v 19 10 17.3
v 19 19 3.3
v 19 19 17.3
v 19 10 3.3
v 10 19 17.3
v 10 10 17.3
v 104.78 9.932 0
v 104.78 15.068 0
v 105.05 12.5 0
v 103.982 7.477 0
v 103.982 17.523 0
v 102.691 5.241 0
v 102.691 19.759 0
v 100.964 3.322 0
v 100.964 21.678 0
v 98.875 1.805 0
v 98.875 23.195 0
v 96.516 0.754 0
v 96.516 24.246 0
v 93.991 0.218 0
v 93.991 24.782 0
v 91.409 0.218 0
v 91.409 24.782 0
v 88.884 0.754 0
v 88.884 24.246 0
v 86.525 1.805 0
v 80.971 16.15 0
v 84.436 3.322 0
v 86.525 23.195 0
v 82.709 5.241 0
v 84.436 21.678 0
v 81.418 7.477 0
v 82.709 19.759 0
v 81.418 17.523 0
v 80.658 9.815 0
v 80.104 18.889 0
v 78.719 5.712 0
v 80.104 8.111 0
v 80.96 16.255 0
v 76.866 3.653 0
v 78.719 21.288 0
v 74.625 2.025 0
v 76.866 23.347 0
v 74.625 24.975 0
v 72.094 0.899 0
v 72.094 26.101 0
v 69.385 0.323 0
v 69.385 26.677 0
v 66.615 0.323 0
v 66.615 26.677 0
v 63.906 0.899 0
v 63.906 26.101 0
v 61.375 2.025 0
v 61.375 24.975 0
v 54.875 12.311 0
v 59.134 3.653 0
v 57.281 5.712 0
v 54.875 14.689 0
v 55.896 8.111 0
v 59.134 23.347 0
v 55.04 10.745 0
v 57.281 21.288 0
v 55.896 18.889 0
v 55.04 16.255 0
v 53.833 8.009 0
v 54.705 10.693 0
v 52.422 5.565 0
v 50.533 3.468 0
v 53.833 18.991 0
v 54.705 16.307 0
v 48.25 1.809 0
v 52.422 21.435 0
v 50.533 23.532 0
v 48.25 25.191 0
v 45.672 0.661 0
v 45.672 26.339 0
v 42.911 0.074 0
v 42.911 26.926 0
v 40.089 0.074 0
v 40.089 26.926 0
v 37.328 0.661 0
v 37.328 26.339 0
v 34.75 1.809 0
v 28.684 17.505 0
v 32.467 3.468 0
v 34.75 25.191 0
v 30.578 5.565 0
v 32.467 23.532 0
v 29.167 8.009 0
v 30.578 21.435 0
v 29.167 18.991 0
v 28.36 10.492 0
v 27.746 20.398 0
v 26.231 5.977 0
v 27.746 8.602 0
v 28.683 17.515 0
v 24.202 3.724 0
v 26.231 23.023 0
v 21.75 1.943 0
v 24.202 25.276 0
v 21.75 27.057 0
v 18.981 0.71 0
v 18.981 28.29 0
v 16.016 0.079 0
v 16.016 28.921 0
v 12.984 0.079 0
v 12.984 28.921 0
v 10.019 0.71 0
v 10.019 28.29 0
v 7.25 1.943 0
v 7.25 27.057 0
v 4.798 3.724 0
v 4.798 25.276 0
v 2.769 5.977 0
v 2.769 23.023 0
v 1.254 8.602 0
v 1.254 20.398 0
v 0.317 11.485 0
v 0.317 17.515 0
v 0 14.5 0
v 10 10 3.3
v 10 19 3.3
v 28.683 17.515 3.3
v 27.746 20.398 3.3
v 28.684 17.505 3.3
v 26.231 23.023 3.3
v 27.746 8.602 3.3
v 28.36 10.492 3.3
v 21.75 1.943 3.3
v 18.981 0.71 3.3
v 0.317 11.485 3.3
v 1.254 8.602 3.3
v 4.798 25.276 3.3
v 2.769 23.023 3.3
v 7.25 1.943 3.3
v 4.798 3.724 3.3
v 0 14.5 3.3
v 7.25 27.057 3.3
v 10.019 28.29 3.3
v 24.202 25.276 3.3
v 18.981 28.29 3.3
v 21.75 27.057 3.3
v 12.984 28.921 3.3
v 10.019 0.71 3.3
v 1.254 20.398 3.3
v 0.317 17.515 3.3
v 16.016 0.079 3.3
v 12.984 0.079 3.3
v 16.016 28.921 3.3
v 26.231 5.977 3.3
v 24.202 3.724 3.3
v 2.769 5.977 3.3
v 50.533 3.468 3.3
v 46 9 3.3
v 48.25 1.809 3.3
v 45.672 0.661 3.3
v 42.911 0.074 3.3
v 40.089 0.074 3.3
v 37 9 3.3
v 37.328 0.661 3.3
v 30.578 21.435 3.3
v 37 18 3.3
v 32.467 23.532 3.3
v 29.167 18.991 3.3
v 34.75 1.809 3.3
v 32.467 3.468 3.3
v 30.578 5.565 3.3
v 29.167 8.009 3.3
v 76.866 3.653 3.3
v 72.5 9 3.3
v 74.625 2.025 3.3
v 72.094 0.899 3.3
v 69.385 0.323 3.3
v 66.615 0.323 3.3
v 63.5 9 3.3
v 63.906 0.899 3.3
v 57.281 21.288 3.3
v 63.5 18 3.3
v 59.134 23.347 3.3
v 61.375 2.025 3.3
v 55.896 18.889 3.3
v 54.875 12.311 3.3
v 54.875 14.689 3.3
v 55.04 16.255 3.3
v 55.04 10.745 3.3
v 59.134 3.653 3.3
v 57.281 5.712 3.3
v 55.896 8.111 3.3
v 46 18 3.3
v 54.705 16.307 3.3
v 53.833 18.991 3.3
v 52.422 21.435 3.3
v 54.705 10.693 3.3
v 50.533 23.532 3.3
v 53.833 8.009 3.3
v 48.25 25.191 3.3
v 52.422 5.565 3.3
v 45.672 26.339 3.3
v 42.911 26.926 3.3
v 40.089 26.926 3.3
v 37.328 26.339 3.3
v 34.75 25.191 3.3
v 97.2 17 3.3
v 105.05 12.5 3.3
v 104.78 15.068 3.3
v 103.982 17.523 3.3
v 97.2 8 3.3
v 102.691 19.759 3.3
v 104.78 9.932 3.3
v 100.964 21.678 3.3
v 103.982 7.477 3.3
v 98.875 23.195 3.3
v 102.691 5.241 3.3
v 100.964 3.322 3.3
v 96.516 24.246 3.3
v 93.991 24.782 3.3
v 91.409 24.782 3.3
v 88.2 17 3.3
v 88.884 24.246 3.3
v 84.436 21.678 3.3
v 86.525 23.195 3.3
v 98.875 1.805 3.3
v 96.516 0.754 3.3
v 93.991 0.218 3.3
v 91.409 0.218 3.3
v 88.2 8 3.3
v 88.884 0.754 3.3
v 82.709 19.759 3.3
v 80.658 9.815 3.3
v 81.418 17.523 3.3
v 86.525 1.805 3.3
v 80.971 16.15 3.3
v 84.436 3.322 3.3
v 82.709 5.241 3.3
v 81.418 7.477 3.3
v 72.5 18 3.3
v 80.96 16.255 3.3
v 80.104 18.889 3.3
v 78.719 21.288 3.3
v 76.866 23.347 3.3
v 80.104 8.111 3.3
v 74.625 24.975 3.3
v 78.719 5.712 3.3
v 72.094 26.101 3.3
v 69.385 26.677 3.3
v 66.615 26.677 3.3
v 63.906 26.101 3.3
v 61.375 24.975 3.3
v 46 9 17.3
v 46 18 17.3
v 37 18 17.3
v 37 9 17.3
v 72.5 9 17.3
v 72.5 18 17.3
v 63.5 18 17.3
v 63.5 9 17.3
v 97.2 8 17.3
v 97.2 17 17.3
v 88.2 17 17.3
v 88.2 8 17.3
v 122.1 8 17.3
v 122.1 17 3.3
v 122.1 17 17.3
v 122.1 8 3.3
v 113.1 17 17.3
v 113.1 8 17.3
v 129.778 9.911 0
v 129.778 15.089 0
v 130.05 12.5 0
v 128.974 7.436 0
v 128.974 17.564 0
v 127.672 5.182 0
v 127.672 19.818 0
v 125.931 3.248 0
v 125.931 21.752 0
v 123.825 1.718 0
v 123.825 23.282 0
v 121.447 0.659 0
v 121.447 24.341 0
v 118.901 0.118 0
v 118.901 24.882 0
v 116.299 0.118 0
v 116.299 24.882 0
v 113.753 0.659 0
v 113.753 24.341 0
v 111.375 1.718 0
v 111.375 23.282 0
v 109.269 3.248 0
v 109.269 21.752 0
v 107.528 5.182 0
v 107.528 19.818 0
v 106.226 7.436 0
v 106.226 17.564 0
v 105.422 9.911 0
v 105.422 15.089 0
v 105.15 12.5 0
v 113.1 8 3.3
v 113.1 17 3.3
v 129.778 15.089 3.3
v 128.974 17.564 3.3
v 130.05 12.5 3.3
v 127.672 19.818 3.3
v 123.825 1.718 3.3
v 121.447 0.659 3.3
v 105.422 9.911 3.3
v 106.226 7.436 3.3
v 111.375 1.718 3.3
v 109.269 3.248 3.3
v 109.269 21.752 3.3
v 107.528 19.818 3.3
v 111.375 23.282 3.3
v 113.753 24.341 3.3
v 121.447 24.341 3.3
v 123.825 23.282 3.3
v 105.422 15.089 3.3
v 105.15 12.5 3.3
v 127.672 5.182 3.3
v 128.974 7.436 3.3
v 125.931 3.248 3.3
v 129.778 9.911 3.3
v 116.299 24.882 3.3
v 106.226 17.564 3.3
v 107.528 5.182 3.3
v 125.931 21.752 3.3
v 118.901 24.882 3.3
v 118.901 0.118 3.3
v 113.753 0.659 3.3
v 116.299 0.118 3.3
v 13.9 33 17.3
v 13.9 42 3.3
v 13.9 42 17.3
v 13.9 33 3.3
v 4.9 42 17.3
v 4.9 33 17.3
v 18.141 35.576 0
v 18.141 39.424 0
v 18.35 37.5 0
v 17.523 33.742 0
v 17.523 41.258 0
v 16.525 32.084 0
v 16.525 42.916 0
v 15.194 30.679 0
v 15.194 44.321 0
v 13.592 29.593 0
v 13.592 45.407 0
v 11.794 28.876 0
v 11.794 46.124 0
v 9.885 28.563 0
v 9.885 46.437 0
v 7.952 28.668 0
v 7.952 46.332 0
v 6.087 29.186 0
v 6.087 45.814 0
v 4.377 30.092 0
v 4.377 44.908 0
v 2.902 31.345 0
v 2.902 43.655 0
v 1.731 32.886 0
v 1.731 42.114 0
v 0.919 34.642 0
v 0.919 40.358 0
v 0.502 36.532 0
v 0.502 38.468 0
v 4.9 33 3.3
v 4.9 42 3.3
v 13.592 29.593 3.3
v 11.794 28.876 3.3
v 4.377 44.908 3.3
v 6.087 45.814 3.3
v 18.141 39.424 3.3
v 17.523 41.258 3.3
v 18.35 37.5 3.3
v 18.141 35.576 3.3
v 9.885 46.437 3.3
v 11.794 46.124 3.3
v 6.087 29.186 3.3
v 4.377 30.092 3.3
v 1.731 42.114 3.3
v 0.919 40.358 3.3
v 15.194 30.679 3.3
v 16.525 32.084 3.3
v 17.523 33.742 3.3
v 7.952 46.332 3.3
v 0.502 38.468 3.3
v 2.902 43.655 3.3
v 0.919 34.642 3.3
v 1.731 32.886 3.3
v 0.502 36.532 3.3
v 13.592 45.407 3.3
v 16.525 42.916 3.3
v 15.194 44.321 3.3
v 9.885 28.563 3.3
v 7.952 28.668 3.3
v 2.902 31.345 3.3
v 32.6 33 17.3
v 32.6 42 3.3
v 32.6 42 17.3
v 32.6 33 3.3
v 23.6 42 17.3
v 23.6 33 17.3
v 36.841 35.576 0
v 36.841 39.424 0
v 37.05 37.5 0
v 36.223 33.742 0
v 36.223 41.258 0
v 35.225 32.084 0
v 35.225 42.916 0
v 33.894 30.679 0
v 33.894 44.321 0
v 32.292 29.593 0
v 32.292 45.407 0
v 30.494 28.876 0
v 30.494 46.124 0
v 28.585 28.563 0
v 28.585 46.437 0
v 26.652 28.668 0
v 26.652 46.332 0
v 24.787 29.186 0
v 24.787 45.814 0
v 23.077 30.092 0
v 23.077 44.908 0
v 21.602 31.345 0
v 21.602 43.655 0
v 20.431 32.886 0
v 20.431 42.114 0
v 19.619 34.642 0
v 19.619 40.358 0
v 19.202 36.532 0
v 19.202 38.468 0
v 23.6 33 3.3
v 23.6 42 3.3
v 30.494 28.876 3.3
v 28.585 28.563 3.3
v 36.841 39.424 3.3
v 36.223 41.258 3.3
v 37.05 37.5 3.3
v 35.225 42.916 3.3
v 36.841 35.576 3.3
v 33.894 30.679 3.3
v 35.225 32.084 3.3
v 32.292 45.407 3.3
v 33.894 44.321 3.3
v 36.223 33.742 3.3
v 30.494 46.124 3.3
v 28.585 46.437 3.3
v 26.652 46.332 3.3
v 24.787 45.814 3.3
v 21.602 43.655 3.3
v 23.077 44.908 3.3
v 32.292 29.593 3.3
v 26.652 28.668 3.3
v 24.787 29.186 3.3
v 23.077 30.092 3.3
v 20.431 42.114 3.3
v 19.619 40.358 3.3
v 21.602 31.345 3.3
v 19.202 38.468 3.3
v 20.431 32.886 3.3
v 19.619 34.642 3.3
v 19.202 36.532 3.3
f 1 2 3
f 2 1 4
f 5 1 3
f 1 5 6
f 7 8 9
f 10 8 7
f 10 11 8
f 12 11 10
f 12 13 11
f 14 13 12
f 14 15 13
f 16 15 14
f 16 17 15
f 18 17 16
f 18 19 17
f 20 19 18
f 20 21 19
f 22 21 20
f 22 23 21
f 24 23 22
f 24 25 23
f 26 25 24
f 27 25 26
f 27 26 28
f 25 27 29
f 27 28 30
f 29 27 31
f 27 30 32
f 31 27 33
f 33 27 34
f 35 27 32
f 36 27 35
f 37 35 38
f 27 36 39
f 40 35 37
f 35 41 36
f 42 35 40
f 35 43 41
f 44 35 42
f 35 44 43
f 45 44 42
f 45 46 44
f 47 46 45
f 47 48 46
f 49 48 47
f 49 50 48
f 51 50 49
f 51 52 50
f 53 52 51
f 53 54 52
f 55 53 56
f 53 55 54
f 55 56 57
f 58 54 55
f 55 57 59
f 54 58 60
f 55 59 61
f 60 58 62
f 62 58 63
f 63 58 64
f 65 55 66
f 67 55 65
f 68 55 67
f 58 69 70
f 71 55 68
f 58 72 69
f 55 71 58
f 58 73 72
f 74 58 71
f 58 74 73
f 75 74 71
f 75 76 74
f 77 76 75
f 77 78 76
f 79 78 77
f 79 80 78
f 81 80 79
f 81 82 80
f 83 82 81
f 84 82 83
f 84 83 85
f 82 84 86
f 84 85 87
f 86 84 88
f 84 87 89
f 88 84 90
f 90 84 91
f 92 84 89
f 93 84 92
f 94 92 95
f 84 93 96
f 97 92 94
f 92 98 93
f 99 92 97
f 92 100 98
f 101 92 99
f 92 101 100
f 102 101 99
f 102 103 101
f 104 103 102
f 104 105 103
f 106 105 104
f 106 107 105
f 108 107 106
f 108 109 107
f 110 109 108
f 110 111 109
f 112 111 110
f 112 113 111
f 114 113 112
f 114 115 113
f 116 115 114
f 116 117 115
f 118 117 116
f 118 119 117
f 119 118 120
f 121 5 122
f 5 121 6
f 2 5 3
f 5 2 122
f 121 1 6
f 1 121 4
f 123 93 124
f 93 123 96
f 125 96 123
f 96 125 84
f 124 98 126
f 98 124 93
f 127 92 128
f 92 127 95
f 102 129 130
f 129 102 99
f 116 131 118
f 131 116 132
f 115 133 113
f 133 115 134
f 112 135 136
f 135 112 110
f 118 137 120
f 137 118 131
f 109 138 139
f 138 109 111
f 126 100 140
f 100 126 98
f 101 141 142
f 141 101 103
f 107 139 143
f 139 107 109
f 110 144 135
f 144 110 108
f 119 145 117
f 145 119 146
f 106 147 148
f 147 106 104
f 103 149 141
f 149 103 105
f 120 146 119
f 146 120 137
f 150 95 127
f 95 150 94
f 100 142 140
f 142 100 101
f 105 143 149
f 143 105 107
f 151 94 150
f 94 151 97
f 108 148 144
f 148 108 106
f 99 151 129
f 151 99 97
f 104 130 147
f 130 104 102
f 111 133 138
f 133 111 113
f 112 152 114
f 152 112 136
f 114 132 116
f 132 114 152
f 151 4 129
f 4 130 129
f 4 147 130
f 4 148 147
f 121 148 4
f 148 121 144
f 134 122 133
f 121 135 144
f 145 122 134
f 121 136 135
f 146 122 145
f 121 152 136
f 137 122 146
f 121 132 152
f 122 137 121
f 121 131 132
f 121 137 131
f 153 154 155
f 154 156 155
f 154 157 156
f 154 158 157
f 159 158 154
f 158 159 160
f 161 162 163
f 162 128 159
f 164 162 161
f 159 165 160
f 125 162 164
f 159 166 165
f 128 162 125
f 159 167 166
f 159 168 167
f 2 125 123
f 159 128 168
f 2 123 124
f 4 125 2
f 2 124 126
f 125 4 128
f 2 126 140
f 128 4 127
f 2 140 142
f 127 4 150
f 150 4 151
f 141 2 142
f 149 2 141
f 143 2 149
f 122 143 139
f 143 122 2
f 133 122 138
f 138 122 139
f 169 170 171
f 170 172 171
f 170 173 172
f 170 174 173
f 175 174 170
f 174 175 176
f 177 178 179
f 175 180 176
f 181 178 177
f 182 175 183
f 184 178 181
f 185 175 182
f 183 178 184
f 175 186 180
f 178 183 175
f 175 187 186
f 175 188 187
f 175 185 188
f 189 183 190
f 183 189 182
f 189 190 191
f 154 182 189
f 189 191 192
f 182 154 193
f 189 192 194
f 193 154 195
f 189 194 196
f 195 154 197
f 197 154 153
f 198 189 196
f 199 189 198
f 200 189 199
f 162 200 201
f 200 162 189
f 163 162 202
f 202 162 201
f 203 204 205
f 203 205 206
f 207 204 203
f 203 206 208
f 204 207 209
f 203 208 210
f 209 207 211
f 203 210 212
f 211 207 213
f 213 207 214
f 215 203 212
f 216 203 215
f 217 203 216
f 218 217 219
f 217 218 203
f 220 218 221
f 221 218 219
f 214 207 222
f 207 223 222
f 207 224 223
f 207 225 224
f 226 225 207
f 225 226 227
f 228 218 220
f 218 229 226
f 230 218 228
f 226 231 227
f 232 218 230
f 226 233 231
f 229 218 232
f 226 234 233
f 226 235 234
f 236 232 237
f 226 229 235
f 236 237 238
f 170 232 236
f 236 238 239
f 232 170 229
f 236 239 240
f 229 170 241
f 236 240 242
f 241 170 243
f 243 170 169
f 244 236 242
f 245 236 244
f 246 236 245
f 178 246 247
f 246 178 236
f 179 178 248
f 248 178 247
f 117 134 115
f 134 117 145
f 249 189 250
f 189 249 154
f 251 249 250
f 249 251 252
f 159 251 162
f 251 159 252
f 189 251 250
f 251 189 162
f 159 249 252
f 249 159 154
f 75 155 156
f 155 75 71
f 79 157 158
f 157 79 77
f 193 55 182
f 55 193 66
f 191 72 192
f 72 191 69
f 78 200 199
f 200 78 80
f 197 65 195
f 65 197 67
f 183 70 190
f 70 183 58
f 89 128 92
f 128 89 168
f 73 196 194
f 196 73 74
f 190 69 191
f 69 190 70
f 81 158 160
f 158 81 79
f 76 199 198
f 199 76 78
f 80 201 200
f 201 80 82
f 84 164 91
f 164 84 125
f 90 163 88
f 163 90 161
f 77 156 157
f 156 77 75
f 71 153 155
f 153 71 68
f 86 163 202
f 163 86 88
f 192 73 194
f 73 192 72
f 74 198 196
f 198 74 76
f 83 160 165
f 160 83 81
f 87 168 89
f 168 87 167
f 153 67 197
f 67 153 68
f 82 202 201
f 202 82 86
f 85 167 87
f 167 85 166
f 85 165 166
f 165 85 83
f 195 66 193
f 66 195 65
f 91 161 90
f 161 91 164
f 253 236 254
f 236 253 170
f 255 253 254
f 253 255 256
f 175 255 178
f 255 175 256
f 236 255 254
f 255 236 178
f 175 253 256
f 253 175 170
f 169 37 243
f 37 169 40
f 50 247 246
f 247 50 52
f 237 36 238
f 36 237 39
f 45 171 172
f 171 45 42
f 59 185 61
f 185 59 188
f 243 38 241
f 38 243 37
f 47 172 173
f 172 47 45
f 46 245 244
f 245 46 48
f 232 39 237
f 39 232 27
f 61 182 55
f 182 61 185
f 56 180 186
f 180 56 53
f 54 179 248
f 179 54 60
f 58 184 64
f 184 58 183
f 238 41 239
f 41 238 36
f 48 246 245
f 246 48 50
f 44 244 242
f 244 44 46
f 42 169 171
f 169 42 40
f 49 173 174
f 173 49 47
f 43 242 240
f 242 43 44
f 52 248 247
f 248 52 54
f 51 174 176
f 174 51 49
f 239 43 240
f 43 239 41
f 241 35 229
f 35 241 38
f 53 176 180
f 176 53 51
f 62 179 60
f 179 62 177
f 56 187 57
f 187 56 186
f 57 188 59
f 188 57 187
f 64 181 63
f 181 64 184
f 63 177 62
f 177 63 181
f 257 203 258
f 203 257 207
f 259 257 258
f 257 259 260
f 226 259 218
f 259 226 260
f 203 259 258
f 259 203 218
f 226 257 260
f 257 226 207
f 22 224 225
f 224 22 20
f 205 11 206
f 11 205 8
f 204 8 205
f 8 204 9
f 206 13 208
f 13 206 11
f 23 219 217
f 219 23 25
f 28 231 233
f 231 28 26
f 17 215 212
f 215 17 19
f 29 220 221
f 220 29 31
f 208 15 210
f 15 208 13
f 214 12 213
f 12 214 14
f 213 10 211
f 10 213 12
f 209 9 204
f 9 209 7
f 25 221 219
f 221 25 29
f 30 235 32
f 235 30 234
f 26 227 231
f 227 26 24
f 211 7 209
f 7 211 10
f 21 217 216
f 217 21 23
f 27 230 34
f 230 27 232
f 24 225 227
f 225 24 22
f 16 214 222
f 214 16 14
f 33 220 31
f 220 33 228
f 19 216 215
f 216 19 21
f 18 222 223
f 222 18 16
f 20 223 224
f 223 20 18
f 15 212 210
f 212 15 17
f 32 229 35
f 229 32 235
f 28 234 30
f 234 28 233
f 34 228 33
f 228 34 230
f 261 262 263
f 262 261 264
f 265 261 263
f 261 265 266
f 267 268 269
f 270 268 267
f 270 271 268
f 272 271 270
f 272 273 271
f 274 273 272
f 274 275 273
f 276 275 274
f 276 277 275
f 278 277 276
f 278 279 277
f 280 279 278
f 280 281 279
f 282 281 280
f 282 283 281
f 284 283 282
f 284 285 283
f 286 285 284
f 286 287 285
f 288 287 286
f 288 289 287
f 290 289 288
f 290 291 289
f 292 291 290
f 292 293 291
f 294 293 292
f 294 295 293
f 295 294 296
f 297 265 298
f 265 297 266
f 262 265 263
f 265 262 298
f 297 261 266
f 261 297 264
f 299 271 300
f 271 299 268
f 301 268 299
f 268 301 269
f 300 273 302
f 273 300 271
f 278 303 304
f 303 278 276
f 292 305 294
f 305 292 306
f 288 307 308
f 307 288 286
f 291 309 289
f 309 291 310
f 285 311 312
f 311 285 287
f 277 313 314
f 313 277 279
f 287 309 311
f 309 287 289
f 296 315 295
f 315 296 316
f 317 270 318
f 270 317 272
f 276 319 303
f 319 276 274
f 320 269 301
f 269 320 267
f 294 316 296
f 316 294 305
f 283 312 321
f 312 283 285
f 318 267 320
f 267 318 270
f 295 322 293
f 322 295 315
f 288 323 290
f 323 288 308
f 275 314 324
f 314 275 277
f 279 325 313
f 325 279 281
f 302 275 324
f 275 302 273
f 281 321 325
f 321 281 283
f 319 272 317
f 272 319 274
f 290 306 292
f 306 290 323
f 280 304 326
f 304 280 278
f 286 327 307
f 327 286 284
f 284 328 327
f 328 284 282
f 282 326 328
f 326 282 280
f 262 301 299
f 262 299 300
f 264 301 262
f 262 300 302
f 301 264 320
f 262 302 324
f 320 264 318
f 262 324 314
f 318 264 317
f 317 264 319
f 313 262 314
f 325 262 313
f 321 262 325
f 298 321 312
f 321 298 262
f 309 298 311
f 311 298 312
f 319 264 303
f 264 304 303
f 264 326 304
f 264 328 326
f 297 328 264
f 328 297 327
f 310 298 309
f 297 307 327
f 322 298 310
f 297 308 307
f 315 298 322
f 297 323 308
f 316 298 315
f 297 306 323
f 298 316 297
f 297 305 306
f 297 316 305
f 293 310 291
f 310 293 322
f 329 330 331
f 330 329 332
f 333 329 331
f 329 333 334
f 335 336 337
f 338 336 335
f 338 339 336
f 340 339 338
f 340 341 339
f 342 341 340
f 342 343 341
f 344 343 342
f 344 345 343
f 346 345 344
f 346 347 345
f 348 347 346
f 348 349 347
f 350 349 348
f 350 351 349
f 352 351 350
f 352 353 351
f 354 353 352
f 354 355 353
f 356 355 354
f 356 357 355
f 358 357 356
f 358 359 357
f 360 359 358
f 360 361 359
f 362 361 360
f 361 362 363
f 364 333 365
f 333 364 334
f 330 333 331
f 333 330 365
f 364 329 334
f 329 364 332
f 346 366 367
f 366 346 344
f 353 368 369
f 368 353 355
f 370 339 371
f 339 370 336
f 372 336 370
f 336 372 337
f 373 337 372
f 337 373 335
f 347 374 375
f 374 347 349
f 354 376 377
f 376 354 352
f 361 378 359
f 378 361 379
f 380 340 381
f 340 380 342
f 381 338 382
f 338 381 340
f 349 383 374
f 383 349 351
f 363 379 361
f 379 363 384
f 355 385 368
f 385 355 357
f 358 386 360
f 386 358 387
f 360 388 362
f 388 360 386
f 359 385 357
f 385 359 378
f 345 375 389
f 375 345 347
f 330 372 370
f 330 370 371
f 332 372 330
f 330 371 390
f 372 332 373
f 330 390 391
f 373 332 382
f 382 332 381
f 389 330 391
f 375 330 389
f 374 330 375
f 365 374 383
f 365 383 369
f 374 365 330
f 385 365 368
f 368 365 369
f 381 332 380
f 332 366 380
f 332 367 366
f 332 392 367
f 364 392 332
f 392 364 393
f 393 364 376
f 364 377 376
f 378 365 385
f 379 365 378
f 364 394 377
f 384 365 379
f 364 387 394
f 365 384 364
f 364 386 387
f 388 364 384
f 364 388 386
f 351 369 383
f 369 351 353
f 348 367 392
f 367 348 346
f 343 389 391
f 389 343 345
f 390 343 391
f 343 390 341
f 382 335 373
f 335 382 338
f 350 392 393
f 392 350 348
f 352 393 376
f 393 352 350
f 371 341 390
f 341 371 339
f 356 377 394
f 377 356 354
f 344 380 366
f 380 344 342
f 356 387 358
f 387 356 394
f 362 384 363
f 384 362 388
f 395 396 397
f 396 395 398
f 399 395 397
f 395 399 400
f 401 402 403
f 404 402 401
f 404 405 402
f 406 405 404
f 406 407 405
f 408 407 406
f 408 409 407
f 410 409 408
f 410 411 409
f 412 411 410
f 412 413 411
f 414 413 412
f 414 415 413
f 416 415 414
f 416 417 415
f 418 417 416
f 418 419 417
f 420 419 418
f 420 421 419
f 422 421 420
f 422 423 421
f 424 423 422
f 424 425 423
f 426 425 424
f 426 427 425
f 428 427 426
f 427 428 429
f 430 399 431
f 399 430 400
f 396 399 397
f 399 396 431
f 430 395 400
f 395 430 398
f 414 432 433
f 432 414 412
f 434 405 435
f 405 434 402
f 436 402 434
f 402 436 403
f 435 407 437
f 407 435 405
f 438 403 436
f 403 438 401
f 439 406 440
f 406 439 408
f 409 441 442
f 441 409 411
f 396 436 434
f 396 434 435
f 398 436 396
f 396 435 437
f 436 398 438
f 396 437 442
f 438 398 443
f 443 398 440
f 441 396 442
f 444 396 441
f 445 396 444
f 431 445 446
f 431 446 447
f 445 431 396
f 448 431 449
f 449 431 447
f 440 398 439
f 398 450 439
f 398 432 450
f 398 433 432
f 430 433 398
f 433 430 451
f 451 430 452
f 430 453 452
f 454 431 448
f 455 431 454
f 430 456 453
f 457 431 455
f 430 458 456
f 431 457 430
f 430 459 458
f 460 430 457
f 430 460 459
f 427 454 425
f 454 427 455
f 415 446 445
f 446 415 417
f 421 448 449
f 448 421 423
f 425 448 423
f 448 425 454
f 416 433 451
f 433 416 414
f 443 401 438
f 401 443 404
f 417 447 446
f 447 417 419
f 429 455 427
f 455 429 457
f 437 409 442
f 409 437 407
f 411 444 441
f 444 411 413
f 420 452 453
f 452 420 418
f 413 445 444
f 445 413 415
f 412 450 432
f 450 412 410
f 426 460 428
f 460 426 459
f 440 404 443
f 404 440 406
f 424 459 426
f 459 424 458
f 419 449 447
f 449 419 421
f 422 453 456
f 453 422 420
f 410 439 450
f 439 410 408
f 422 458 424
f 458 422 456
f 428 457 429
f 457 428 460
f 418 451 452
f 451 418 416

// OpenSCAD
//translate([-140/2, -45/2, 0])
pad_w = 140;
pad_d = 47;
pad_h = 1;
//cube([pad_w, pad_d, pad_h]);

module peg(x, y, d, w, h)
{
    //w = 9;
    //h = 17.3;
    translate([x - w/2, y - w/2, 0])
    {
        cube([w, w, h]);
    }
    r = d/2 + 0.5;
    translate([x, y, 0])
    {
        cylinder(3.3, r, r);//just for checking
    }
}

sockets = [
    [  14.5,   14.5, 28.0, 9, 17.3], //d21
    [  41.5,   13.5, 26.0, 9, 17.3], //d19
    [  68.0,   13.5, 25.5, 9, 17.3], //d19h
    [  92.7,   12.5, 23.7, 9, 17.3], //d18h
    [ 117.6,   12.5, 23.9, 9, 17.3], //d17

    [   9.4,   37.5, 16.9, 9, 17.3], //d10
    [  28.1,   37.5, 16.9, 9, 17.3], //d11

//    [  11.0,   31.0, 22.0, 9, 17.3], //d16
//    [ 163.6,   11.0, 22.0, 9, 17.3], //d15
//    [ 184.4,    9.9, 19.8, 9, 17.3], //d14
//    [ 203.3,    9.9, 17.9, 9, 17.3], //d13
//    [ 221.2,    8.5, 16.9, 9, 17.3], //d12

    // [  0.0,   0.0, 29.9, 9, 17.3], //s22
    // [  0.0,   0.0, 25.8, 9, 17.3], //s19
    // [  0.0,   0.0, 23.9, 9, 17.3], //s17
    // [  0.0,   0.0, 21.8, 9, 17.3], //s16
    // [  0.0,   0.0, 21.8, 9, 17.3], //s15
    // [  0.0,   0.0, 19.8, 9, 17.3], //s14
    // [  0.0,   0.0, 17.8, 9, 17.3], //s13
    // [  0.0,   0.0, 16.8, 9, 17.3], //s12
    // [  0.0,   0.0, 16.8, 9, 17.3], //s11
    // [  0.0,   0.0, 16.9, 9, 17.3], //s10
];


for ( s = sockets)
{
    echo(s);
    peg(s[0], s[1], s[2], s[3], s[4]);
}
